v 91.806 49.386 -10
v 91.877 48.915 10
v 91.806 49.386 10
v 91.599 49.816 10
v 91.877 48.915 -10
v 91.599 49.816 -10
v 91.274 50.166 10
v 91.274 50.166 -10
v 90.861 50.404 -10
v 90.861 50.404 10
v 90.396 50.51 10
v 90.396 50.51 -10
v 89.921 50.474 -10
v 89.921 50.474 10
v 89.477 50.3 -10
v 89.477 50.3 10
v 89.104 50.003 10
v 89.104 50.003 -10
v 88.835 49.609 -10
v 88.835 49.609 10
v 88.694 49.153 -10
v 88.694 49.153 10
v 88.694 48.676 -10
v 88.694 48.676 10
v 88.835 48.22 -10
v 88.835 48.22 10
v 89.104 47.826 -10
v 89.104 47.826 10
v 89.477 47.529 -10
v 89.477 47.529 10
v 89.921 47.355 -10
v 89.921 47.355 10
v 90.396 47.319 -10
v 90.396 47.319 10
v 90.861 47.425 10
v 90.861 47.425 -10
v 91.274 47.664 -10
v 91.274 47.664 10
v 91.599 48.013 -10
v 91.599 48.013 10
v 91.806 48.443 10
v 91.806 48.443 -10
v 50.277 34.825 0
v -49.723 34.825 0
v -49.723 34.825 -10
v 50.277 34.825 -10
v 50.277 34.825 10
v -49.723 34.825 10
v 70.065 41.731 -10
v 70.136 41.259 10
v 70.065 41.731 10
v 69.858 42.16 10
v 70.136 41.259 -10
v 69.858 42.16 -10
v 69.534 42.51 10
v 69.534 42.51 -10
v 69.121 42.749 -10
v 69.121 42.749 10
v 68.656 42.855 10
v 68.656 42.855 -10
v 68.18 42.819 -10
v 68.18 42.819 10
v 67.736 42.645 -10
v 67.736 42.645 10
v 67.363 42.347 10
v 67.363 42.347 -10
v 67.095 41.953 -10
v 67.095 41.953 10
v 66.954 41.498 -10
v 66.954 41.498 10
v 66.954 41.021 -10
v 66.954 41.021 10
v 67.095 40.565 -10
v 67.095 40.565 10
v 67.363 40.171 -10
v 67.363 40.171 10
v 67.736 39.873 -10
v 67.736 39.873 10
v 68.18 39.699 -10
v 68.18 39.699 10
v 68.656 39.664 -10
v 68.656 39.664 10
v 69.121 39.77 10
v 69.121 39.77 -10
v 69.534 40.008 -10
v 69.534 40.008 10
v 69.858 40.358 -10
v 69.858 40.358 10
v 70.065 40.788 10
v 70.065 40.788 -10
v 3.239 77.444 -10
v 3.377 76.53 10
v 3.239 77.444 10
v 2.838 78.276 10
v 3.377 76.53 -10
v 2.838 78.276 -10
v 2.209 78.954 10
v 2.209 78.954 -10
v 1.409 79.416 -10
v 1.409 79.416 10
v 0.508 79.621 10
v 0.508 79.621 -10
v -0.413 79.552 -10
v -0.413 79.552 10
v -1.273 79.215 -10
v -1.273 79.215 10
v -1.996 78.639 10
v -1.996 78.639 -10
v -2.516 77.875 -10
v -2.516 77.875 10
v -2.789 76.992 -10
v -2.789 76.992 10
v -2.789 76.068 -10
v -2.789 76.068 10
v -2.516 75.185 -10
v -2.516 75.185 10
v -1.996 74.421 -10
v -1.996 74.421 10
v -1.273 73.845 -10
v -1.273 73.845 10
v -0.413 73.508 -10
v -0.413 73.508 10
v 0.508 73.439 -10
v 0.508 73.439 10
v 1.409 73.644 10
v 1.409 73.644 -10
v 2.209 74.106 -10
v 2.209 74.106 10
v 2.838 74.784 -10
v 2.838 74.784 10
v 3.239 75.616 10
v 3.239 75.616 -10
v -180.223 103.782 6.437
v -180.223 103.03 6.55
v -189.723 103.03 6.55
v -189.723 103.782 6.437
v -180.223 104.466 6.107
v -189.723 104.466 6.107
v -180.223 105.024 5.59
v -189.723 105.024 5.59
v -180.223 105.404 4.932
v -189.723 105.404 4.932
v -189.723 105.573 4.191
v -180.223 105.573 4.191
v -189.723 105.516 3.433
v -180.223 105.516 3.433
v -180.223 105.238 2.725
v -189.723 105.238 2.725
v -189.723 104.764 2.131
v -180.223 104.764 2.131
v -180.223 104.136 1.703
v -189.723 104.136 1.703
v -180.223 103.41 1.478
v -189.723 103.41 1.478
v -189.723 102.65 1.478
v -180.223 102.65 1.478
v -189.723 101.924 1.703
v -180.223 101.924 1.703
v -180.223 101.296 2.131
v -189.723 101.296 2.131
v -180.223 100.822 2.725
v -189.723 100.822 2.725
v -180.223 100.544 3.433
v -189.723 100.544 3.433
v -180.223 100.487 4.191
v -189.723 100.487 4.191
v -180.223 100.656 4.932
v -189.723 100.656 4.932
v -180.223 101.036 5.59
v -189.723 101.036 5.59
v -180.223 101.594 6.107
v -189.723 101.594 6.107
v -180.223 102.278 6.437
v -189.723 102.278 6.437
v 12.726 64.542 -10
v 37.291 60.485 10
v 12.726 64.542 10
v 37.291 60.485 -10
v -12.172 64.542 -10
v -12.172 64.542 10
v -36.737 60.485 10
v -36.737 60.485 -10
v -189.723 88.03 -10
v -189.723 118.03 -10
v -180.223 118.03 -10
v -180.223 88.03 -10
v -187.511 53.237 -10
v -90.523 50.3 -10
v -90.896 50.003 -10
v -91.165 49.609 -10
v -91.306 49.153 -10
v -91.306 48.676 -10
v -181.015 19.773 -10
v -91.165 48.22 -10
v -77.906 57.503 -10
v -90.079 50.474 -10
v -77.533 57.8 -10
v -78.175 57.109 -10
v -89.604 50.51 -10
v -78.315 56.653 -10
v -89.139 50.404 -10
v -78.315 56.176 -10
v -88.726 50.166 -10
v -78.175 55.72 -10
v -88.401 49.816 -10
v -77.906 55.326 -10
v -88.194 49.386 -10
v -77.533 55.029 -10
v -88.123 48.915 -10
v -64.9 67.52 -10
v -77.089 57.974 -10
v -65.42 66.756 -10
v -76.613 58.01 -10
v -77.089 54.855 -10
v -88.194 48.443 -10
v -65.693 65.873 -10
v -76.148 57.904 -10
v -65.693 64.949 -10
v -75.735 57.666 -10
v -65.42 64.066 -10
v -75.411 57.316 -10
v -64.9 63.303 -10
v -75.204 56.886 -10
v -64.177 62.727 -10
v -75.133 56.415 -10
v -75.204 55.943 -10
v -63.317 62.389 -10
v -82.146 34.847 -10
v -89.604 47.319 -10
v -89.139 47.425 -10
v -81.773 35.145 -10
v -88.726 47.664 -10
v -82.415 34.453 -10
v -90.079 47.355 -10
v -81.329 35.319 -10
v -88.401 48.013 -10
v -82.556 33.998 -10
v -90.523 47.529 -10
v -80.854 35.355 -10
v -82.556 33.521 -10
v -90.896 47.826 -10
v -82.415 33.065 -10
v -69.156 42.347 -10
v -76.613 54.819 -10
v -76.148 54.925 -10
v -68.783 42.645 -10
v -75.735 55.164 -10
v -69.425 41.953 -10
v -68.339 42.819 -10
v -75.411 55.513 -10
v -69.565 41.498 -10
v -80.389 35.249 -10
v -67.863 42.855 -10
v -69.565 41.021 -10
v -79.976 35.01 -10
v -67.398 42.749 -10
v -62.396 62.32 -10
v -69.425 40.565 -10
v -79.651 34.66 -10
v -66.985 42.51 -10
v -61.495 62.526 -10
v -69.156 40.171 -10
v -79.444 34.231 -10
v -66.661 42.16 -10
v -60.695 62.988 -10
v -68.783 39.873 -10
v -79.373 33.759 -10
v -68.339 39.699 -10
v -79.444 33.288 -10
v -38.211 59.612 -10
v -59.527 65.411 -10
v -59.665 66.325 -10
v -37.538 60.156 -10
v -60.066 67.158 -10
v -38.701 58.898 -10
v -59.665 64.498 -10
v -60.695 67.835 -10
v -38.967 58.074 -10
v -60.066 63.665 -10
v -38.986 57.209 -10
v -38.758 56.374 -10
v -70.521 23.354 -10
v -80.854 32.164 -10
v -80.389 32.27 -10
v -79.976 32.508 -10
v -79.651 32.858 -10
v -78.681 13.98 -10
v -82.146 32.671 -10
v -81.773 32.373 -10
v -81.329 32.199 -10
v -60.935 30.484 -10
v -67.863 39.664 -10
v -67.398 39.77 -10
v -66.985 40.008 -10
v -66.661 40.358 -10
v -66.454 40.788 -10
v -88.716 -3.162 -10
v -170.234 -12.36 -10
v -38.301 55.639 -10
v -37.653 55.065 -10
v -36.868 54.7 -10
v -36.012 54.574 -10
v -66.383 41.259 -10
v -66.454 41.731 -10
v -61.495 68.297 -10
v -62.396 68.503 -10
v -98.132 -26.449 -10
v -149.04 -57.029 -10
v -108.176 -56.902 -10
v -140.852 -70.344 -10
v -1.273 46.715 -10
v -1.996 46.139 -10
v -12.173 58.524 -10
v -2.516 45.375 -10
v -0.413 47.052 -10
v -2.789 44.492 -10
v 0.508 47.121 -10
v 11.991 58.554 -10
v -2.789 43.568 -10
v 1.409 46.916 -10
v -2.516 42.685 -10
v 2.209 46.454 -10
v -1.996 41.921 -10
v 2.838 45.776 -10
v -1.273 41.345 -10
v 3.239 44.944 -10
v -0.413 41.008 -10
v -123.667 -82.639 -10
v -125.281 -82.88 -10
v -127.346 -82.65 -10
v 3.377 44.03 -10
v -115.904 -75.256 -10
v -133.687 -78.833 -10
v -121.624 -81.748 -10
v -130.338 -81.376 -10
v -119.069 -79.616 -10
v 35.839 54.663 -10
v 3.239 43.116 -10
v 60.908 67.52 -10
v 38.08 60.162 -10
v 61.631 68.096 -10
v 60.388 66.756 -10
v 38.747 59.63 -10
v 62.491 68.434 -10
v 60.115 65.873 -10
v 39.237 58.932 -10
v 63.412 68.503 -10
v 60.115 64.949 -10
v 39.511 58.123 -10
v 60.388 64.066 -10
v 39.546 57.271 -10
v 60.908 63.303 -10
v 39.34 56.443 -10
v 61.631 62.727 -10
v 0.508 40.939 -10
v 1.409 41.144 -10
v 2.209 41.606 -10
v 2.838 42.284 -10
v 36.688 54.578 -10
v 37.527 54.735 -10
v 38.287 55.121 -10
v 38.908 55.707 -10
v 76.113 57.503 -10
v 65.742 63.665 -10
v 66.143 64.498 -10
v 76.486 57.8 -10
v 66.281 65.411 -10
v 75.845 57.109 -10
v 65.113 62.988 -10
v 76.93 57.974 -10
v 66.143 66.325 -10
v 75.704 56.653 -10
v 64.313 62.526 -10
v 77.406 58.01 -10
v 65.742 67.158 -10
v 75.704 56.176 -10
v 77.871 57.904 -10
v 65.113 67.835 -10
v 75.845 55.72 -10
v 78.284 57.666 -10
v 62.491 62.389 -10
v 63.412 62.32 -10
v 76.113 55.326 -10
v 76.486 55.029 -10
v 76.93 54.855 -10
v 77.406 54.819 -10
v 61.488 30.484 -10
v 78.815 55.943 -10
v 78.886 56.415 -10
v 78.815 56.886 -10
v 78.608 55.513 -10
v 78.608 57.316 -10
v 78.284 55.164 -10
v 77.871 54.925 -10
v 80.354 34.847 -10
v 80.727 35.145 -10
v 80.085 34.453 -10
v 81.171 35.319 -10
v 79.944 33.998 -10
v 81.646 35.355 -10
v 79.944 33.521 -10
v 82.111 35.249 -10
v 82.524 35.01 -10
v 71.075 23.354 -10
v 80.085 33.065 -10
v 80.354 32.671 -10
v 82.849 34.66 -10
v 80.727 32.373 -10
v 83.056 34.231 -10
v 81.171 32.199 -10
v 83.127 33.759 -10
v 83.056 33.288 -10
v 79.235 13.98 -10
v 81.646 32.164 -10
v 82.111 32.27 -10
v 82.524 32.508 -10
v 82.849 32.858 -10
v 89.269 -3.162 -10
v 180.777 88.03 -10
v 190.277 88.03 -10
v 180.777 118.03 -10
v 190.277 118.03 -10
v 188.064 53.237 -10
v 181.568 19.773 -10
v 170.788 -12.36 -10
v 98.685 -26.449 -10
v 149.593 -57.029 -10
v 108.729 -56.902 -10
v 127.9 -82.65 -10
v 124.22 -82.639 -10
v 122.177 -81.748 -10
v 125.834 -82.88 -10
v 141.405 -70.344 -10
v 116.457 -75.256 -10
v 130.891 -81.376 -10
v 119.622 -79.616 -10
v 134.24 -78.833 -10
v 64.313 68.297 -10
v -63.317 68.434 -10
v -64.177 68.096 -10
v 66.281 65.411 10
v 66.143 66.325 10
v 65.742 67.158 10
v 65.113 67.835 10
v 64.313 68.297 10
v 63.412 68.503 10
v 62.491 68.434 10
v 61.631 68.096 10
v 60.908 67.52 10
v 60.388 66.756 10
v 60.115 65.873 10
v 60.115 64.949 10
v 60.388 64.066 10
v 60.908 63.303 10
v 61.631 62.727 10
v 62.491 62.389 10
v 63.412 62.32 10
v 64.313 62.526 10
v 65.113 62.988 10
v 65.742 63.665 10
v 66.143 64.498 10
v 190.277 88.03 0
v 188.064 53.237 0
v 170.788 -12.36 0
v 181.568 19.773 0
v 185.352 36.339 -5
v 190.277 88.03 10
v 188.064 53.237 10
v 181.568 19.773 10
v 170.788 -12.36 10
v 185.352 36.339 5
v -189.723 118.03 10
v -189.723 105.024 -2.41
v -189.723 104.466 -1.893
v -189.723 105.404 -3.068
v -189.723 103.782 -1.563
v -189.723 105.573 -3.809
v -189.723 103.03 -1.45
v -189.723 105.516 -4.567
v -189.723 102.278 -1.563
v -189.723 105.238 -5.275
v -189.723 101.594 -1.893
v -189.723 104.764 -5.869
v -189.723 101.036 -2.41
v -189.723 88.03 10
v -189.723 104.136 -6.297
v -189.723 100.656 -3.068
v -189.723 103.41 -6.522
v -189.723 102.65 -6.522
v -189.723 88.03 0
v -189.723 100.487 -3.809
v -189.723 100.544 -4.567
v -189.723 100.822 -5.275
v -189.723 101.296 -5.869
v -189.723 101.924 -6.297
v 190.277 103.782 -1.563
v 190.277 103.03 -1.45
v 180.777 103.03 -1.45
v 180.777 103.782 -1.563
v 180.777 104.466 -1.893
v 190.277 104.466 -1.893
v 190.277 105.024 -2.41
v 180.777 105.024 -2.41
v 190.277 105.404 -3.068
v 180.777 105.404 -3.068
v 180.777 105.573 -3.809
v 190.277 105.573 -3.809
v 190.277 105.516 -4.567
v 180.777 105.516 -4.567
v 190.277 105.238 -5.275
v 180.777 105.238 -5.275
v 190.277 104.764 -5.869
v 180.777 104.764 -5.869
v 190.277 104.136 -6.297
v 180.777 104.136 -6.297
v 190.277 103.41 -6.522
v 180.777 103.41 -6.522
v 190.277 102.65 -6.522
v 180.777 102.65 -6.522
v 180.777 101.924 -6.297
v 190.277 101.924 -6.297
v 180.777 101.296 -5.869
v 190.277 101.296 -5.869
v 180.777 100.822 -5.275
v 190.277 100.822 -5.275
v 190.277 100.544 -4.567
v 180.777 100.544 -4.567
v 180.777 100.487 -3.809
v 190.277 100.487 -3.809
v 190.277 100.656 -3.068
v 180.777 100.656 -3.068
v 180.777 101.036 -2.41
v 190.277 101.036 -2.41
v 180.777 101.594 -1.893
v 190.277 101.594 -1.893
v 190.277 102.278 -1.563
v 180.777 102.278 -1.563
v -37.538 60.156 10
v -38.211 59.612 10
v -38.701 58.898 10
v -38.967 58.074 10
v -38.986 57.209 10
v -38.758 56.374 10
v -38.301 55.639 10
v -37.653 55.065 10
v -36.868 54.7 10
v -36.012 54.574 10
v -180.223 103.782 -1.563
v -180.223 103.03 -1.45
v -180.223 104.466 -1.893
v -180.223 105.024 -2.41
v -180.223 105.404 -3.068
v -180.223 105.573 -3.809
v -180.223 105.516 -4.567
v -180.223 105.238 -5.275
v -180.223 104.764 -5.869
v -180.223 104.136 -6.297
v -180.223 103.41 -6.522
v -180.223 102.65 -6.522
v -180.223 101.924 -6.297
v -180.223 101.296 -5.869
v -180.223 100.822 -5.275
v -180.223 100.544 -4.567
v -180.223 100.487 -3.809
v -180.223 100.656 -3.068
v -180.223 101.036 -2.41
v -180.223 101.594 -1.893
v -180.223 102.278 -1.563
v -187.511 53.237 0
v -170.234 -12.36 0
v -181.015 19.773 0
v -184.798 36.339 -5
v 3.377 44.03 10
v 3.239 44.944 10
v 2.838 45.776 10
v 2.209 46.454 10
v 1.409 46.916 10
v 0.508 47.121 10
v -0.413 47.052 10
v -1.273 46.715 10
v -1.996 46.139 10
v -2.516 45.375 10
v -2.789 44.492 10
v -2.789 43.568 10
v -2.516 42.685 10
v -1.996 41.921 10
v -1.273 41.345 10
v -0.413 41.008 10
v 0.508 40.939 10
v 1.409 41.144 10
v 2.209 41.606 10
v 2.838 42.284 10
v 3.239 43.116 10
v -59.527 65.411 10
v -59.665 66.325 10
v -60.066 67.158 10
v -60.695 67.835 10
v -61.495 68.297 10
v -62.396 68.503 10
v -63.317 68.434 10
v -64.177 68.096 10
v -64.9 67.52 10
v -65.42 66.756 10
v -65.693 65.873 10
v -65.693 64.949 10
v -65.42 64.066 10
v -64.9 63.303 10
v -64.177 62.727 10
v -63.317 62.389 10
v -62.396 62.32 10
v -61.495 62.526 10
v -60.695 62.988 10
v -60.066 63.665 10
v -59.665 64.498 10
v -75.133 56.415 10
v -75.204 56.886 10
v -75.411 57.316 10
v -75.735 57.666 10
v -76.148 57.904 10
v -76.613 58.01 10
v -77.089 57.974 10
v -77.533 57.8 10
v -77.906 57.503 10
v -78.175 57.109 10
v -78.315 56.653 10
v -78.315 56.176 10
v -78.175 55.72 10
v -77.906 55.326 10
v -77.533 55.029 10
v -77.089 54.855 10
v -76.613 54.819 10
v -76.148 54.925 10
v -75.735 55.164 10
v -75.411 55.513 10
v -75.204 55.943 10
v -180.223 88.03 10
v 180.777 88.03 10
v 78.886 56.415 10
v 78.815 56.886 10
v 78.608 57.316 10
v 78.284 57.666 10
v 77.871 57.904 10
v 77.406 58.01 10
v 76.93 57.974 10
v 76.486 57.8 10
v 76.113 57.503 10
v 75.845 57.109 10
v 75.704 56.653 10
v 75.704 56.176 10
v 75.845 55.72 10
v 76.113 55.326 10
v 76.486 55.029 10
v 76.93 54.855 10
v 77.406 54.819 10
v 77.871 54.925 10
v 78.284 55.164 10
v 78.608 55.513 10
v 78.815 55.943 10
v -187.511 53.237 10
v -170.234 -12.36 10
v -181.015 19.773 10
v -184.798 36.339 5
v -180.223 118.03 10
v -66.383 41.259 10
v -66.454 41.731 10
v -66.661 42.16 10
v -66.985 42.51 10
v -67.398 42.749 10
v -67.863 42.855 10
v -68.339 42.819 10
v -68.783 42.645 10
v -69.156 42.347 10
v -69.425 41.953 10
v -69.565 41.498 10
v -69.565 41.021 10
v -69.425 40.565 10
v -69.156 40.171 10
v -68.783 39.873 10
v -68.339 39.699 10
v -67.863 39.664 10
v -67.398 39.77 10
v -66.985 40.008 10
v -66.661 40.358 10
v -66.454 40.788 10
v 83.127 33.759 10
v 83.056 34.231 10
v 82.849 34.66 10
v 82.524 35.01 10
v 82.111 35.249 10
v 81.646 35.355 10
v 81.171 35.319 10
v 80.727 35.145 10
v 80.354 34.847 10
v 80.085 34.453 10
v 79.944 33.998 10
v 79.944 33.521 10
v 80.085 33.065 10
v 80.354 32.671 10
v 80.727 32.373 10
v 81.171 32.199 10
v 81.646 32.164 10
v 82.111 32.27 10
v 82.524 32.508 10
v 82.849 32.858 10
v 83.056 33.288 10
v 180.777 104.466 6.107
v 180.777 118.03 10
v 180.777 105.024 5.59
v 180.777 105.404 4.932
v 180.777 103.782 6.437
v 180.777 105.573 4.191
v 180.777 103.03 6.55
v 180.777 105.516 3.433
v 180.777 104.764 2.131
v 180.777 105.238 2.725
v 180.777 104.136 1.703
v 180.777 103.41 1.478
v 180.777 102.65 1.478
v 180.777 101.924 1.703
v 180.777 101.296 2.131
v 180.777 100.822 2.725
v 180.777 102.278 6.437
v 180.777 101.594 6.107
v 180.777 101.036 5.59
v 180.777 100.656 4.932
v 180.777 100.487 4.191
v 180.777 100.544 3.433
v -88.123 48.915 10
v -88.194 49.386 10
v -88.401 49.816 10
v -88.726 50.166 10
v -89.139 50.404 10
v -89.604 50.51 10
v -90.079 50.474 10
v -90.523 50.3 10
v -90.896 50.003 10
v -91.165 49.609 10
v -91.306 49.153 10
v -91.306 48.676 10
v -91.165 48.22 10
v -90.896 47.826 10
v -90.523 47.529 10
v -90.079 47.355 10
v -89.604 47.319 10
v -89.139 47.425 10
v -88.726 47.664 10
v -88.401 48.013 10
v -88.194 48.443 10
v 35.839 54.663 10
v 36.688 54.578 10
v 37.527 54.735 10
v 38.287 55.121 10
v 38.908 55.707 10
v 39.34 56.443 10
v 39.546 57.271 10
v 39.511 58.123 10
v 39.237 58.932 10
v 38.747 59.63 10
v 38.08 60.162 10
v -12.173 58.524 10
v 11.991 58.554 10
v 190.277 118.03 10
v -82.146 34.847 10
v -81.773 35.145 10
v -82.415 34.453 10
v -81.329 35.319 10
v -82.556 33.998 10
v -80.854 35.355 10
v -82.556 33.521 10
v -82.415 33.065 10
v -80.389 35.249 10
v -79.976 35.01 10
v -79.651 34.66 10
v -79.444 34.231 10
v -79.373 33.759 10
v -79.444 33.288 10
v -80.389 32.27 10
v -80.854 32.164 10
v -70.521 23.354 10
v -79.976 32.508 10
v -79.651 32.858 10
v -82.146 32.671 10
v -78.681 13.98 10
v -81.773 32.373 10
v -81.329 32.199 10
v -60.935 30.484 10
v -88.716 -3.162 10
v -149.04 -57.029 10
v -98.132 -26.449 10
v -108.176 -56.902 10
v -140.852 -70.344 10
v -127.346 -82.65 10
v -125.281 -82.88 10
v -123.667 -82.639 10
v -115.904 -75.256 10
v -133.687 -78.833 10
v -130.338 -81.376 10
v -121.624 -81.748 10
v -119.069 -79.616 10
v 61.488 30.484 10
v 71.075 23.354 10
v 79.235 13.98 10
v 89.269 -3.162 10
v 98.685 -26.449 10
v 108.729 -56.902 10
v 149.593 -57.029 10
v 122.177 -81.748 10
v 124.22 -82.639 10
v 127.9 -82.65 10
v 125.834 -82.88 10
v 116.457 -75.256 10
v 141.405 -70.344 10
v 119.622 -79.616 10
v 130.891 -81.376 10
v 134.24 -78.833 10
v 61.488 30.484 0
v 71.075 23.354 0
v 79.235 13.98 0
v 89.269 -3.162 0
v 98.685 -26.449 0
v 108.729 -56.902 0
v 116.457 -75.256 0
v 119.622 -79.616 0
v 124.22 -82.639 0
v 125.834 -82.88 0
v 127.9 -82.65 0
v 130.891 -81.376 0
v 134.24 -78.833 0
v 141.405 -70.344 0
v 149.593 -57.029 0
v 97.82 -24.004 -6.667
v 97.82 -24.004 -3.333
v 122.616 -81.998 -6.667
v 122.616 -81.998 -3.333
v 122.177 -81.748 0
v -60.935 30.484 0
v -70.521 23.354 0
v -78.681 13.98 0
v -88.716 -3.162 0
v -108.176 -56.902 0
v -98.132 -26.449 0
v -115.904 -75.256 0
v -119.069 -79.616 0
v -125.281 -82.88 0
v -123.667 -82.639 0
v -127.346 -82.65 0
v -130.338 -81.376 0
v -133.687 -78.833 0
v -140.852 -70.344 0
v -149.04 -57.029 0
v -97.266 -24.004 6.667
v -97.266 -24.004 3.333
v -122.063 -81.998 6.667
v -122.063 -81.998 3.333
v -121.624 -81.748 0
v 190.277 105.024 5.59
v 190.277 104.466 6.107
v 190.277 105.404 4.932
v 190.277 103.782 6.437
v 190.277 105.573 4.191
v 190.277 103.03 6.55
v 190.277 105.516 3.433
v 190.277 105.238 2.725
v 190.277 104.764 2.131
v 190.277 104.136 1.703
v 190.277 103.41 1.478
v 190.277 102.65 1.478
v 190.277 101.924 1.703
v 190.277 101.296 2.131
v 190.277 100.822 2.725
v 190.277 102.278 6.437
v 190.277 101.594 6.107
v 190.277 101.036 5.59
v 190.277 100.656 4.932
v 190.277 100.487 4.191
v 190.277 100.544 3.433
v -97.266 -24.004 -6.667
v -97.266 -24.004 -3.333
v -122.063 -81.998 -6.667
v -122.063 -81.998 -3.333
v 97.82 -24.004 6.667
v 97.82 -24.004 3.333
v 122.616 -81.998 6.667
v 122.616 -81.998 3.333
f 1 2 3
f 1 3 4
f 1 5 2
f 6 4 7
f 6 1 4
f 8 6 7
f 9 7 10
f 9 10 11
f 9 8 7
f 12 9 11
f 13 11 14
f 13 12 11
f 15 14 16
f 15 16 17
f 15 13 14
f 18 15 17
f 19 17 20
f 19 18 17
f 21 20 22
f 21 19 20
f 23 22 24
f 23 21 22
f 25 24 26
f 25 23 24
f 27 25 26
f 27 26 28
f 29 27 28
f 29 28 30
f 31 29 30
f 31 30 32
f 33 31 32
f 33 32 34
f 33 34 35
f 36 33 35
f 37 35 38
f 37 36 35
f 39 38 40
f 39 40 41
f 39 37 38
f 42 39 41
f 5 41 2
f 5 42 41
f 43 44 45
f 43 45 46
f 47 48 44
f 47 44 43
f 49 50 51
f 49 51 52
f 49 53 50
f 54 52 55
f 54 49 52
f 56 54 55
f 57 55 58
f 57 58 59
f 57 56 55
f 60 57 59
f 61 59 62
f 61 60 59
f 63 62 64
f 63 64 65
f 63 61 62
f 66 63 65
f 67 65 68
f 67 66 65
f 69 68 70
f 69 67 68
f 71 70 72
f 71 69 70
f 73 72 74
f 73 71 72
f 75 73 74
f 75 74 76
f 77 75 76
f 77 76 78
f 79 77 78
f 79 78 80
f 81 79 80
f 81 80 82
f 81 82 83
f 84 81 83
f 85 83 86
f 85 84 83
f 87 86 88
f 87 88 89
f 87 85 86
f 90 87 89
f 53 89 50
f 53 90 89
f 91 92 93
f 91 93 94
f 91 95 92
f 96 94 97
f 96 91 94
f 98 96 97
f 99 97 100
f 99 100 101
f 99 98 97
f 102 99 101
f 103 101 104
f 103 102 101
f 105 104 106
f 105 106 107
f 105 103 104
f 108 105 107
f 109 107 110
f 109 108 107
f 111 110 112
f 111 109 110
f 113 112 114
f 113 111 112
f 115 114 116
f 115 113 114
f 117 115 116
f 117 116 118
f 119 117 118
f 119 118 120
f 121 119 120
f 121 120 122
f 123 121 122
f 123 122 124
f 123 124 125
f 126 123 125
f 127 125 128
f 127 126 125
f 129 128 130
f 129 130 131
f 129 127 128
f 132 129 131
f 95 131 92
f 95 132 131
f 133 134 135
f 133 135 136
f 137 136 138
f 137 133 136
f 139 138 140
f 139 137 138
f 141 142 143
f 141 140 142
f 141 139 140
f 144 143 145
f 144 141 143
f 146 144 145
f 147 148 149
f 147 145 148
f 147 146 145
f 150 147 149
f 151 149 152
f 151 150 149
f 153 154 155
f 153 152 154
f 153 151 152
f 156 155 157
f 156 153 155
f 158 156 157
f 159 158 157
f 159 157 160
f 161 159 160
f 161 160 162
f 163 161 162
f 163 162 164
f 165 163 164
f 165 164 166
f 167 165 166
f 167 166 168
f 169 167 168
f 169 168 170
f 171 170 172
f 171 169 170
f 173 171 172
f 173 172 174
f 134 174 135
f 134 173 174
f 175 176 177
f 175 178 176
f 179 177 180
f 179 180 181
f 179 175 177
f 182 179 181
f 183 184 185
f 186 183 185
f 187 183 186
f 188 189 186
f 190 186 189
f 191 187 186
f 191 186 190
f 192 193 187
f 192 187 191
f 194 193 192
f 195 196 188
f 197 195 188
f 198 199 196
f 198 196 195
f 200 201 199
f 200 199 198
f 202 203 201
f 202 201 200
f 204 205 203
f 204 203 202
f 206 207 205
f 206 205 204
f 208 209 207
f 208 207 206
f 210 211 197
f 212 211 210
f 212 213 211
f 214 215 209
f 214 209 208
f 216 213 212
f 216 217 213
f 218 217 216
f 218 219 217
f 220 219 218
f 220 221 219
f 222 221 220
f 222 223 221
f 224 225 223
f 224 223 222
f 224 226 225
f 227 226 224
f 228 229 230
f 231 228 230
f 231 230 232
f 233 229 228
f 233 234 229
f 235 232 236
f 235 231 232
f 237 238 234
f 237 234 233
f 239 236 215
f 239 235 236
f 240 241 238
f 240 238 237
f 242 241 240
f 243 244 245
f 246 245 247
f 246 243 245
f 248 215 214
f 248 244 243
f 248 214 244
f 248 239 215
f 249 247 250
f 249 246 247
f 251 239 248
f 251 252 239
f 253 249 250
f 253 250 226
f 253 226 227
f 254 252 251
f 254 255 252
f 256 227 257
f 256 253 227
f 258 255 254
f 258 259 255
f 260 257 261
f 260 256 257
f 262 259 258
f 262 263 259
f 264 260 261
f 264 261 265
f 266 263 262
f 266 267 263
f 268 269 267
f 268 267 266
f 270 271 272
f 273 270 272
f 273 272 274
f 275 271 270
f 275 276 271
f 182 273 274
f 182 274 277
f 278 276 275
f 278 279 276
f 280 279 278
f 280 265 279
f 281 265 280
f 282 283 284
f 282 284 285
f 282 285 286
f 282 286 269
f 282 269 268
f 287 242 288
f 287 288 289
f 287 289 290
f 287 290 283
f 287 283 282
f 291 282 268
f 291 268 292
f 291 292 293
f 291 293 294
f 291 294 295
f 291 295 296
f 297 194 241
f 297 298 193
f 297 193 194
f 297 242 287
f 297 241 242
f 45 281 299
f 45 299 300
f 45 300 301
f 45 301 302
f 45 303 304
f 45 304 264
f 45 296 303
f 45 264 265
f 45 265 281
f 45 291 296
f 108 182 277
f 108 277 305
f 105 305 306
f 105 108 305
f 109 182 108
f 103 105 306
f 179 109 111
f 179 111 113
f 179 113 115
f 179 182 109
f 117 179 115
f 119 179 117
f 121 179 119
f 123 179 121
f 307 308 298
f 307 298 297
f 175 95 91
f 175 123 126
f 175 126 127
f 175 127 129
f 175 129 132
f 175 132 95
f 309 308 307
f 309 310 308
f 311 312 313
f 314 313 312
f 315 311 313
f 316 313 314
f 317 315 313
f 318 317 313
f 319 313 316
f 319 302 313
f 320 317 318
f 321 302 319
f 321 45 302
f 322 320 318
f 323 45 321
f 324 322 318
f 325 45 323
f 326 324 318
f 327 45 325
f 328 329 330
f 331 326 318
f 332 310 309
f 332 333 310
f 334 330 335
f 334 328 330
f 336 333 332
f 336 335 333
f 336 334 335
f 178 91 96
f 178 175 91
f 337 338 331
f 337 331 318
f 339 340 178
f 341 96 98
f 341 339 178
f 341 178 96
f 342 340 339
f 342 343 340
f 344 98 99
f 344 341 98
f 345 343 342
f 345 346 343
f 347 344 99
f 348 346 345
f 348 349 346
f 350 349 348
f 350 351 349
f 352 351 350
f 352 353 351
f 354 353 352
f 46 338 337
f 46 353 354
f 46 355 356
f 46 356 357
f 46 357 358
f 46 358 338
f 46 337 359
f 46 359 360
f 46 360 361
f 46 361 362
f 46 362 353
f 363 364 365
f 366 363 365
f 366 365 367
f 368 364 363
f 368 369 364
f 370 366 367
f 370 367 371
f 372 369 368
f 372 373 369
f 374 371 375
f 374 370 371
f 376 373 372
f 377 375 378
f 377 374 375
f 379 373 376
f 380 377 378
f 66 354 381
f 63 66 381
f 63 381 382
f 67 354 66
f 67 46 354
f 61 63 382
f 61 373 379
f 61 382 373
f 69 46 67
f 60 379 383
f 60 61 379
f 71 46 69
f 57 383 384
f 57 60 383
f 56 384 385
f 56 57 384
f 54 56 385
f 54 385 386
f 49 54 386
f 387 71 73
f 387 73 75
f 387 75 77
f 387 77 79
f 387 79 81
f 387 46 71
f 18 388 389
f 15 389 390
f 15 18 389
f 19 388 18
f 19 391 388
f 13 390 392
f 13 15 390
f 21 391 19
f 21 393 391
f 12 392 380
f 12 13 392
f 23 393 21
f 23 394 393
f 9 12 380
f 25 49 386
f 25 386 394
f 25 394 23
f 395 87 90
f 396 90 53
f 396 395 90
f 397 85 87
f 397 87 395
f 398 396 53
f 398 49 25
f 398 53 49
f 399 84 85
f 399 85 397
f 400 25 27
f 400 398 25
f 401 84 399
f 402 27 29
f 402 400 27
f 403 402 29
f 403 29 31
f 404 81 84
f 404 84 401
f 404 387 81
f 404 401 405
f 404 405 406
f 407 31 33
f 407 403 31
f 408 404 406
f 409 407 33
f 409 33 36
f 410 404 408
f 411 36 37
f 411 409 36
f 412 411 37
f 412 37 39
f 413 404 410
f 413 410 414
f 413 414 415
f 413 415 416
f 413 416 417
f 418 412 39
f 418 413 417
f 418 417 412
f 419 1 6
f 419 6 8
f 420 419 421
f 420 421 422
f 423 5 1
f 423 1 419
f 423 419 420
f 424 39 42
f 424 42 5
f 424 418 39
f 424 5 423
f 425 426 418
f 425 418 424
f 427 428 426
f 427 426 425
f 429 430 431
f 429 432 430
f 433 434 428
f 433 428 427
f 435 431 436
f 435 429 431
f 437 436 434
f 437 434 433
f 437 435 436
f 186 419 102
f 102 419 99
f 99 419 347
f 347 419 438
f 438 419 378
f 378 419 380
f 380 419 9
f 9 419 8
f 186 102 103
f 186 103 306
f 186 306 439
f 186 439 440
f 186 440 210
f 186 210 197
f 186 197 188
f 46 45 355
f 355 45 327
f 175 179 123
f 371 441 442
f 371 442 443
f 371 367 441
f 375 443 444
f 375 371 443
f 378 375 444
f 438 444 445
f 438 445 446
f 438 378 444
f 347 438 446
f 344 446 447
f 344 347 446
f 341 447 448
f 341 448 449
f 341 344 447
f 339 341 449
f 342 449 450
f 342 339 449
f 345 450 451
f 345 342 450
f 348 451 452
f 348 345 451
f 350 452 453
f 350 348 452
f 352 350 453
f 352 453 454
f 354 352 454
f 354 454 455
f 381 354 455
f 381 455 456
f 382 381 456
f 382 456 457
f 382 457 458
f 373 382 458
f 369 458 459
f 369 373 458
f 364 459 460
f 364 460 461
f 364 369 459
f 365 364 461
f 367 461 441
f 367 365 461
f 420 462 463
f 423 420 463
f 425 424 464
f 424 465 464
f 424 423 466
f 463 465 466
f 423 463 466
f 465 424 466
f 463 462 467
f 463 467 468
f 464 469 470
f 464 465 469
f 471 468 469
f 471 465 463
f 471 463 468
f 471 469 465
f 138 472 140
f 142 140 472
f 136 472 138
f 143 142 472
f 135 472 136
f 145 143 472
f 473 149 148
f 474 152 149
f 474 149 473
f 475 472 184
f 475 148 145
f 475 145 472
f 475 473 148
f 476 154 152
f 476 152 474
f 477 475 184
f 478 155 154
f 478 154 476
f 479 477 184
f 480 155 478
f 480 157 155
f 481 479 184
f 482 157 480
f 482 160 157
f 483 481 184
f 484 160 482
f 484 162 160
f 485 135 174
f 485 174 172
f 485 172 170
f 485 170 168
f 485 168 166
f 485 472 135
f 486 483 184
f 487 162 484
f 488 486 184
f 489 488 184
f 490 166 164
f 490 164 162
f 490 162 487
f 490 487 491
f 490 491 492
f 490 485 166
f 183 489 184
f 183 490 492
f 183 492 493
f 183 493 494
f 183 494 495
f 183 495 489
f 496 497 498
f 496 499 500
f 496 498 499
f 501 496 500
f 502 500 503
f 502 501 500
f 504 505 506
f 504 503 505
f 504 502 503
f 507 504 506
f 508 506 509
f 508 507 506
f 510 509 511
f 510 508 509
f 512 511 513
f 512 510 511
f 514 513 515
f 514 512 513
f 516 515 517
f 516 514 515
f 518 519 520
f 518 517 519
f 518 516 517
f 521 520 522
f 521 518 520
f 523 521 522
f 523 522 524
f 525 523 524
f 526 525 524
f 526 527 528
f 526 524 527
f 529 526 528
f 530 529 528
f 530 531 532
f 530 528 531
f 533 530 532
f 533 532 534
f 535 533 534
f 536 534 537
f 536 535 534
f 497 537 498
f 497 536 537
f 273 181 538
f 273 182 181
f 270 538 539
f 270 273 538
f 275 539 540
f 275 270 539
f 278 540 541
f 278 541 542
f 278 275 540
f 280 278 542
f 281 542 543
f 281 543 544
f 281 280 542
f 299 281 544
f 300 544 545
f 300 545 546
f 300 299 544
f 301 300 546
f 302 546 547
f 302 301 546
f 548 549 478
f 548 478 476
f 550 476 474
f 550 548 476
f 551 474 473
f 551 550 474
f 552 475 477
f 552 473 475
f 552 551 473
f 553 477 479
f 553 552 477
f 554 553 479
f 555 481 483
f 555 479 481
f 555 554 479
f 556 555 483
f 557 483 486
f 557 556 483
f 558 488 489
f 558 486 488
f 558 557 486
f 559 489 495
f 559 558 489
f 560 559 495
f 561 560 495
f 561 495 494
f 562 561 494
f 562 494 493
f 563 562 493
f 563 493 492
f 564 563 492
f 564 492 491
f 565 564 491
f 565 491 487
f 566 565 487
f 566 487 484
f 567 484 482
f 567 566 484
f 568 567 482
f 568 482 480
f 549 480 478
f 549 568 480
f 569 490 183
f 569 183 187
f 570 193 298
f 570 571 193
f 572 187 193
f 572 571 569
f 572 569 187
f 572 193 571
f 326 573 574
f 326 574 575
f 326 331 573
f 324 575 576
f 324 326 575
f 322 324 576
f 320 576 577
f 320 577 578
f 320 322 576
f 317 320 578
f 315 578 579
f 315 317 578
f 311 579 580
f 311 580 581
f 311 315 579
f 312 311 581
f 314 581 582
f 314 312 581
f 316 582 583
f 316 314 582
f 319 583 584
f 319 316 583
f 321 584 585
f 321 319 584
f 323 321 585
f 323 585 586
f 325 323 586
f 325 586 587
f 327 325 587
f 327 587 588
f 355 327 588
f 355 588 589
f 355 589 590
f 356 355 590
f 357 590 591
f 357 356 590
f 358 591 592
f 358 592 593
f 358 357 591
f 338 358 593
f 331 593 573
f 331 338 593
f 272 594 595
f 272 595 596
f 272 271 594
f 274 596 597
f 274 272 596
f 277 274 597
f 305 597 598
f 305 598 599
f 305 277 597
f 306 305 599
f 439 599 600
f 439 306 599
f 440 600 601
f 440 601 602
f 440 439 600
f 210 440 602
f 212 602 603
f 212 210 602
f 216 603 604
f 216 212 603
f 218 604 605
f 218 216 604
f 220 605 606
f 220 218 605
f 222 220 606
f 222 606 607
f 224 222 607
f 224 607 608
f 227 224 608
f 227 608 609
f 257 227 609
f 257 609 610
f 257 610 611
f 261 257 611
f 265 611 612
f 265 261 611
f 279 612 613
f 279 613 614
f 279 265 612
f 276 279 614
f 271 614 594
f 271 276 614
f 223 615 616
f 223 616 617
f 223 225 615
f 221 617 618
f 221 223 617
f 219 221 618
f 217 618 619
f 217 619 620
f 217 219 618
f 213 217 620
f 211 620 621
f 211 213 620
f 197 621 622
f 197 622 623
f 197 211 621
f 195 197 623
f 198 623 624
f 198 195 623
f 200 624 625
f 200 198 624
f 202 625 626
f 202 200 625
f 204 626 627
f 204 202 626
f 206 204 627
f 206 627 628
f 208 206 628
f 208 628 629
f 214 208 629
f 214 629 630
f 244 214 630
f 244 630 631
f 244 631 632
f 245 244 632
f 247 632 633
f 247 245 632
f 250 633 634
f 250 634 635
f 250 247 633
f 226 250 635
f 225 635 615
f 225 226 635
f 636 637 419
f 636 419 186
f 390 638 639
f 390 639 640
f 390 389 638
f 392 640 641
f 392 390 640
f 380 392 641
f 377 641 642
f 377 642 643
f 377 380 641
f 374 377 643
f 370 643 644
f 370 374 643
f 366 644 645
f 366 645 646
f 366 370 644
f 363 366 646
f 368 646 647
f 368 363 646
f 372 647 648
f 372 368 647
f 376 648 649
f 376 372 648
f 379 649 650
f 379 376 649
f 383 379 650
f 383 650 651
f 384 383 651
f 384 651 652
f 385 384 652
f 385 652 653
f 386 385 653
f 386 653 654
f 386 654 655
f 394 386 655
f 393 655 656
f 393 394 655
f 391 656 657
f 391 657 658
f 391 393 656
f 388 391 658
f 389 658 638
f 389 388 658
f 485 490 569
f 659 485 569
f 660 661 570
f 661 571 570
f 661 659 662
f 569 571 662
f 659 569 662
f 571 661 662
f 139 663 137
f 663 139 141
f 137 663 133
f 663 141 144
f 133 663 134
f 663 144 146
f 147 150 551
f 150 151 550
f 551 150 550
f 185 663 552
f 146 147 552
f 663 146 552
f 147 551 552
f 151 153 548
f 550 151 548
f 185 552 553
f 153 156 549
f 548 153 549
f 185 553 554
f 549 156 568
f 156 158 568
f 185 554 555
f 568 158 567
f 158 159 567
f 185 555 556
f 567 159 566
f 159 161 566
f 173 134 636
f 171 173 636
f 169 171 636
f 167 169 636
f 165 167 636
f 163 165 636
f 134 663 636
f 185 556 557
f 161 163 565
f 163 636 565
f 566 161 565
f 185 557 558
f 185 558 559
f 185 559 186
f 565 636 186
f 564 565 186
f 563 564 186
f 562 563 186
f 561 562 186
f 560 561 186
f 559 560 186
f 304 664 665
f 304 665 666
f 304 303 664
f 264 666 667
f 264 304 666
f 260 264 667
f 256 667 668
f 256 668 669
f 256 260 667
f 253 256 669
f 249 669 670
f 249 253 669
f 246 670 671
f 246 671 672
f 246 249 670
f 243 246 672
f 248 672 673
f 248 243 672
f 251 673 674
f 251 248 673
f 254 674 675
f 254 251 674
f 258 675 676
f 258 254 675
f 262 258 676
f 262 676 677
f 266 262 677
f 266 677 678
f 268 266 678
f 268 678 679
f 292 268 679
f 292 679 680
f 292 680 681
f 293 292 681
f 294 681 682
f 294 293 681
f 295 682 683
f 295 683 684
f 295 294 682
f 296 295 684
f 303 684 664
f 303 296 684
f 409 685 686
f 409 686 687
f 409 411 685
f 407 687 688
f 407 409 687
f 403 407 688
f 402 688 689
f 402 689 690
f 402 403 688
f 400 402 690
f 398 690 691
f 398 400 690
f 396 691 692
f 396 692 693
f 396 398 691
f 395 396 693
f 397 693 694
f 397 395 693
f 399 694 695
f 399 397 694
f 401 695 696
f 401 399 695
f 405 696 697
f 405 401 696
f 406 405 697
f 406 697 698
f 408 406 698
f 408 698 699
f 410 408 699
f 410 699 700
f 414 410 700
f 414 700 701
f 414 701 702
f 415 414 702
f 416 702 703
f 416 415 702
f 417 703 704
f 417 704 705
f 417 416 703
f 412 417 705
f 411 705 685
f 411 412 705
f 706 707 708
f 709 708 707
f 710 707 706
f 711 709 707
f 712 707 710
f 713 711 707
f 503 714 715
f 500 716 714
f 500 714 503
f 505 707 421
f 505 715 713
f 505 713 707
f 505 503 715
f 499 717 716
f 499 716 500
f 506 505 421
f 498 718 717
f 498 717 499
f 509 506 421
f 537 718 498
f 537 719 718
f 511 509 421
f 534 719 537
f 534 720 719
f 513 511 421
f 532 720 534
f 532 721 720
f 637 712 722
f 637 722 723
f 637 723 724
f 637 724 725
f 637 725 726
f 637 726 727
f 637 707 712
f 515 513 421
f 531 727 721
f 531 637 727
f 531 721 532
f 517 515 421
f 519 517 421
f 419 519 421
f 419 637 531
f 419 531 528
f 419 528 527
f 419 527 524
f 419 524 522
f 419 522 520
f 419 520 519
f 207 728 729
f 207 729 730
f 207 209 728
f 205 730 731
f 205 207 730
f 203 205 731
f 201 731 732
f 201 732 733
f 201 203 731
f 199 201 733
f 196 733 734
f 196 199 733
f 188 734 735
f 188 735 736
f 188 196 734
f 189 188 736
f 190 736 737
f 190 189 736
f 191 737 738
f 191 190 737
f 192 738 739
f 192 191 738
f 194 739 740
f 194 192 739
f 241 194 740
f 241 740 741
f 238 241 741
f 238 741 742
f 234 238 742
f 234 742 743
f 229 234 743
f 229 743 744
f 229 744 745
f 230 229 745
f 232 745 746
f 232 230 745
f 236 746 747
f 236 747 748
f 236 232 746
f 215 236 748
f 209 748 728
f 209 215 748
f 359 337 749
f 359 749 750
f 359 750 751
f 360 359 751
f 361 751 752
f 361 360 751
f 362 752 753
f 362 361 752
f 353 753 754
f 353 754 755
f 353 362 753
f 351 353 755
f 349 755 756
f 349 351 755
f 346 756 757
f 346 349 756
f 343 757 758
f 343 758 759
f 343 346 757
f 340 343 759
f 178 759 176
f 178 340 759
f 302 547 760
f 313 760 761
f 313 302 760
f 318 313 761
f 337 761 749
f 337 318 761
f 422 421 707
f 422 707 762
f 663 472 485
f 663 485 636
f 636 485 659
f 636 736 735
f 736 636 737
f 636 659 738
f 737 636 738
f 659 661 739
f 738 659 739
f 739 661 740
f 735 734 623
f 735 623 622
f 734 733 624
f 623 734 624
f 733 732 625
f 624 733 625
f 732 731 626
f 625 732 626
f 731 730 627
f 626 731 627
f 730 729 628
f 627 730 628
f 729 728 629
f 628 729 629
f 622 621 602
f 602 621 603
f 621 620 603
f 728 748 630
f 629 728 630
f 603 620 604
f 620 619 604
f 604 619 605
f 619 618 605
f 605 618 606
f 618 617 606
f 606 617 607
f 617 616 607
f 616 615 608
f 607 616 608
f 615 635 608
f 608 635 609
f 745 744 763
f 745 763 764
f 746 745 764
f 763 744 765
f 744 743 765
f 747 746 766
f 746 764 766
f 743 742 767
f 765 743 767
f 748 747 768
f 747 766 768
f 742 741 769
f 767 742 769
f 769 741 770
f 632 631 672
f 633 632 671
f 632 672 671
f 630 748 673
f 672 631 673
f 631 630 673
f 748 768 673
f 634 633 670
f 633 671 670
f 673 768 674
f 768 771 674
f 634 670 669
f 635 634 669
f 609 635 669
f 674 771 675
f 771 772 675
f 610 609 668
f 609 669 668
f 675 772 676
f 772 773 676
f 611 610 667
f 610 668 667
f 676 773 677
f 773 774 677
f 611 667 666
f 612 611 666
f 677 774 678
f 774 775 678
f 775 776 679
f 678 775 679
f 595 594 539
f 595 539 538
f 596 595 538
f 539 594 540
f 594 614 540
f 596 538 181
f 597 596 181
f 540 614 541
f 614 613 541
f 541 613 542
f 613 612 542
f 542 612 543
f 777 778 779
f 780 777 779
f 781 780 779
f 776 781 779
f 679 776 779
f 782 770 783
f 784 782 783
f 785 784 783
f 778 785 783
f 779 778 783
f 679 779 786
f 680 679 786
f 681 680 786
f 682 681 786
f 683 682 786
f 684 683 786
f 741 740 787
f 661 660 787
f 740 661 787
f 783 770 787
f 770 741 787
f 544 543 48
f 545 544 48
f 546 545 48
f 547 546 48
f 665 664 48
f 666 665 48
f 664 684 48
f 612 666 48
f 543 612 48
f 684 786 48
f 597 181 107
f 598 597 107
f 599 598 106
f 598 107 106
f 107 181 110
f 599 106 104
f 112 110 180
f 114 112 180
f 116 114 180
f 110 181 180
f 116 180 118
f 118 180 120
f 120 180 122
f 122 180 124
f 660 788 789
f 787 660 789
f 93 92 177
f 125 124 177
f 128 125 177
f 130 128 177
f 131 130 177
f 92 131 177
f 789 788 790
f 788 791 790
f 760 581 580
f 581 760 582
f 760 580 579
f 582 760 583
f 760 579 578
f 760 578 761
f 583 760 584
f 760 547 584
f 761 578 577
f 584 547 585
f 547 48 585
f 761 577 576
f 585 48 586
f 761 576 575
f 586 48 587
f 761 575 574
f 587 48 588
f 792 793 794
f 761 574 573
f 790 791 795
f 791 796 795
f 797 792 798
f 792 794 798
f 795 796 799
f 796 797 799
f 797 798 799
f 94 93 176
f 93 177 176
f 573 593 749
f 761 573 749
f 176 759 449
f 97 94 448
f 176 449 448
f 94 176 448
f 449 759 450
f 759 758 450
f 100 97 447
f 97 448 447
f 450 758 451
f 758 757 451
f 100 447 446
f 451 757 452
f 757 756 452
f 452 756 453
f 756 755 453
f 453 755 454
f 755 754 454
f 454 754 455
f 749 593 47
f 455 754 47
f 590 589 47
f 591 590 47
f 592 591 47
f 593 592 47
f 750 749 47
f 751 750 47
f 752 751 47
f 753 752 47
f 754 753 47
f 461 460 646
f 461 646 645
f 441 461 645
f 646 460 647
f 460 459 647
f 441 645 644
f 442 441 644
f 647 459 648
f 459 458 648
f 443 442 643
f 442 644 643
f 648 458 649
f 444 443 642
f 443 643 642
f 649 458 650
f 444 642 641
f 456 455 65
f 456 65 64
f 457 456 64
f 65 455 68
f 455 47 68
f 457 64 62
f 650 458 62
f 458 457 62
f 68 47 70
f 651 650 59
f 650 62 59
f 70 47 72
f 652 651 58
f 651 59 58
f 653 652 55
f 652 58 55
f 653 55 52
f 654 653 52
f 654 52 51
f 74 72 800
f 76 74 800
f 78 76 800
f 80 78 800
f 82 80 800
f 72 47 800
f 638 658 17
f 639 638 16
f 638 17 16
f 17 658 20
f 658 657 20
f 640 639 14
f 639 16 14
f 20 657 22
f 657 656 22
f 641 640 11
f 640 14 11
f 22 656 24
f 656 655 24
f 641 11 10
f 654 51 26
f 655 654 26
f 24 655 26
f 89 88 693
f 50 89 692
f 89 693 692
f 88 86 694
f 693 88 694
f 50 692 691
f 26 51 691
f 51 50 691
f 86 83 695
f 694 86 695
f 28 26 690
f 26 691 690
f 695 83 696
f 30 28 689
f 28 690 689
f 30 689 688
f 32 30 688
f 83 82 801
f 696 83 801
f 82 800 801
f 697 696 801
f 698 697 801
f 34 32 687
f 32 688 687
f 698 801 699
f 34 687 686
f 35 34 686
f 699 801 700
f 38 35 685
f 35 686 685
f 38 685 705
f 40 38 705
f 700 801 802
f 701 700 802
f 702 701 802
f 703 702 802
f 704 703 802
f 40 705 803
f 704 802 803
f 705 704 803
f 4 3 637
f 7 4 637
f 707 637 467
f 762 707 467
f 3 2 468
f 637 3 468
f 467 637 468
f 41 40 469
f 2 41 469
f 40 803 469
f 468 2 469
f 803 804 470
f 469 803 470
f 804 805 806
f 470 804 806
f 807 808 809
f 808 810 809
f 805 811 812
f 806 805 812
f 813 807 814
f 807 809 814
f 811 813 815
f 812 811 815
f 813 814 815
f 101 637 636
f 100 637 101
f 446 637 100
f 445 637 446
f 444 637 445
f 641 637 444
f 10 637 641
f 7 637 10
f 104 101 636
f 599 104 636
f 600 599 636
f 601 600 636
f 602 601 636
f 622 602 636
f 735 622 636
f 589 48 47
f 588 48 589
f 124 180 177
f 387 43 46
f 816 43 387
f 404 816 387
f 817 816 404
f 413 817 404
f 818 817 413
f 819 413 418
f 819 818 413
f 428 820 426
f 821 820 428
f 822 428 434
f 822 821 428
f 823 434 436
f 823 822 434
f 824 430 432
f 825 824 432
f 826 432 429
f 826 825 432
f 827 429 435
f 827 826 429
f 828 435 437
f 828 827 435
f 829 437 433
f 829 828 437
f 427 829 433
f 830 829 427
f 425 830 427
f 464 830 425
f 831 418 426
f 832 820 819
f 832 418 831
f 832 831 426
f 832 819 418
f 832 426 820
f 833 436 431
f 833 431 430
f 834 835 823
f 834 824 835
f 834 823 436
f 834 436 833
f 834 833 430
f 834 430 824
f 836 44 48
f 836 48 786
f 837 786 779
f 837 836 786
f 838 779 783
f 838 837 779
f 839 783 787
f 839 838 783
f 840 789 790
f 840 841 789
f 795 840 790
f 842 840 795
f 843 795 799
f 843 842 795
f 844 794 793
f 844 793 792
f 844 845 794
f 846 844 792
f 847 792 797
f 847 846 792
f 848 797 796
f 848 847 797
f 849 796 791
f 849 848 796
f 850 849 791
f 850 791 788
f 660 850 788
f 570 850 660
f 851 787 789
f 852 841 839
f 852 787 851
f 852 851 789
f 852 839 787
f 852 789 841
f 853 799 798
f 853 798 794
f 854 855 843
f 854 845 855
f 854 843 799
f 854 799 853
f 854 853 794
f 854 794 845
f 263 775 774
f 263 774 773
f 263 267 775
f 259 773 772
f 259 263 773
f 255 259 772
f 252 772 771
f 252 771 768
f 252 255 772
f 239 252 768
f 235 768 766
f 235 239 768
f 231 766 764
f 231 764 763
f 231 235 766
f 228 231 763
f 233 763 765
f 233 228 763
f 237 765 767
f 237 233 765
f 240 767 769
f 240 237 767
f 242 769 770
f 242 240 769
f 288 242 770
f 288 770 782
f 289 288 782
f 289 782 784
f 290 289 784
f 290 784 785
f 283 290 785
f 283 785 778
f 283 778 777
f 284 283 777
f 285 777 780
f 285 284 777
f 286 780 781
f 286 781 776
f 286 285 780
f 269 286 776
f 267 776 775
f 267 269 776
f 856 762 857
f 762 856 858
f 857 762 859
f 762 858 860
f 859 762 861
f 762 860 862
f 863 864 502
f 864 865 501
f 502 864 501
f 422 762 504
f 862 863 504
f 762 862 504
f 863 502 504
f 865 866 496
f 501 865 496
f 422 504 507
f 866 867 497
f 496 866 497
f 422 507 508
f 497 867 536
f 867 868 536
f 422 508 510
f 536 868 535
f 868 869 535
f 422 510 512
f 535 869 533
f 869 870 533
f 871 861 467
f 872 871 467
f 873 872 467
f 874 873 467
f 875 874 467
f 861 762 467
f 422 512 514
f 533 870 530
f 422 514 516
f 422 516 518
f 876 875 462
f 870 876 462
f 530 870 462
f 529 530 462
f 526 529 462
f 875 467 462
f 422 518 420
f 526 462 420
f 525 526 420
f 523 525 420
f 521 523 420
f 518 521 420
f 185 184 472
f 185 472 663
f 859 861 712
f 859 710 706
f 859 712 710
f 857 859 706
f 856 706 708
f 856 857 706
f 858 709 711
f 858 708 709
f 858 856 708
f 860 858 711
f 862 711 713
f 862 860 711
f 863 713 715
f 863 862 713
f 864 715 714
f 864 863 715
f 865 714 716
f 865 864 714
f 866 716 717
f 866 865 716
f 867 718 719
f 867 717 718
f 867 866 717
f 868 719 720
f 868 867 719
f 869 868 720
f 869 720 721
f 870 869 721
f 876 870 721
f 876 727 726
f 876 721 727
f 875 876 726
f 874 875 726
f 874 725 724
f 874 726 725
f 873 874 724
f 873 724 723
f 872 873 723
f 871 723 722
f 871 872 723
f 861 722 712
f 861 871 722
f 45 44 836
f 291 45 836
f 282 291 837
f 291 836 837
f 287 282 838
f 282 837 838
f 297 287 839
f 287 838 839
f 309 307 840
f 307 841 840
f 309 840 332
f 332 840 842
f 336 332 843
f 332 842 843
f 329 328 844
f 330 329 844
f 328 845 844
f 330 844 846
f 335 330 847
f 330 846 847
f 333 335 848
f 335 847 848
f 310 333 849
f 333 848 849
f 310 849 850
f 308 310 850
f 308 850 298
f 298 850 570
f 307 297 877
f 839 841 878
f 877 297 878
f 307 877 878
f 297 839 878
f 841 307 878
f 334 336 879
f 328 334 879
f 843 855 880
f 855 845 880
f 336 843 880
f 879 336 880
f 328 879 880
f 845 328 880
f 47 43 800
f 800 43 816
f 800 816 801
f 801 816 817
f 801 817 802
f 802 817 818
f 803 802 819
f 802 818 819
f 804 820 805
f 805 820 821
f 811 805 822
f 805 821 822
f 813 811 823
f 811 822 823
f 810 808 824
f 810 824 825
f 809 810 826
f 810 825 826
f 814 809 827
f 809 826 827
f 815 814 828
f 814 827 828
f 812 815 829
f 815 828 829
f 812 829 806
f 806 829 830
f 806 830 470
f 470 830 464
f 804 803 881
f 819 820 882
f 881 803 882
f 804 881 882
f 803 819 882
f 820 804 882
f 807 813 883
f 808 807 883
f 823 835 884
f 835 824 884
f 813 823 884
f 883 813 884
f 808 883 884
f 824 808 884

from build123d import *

# Parameters (mm, degrees)
SKETCH_1_R               = 3.1
SKETCH_1_R_2             = 1.6
EXTRUDE_1_DEPTH          = 10
SKETCH_7_W               = 9.5
SKETCH_7_H               = 20
EXTRUDE_2_DEPTH          = 30
CUT_EXTRUDE_1_DEPTH      = 399.034023277
CUT_EXTRUDE_1_DEPTH_BACK = 399.034023277
SKETCH_8_R               = 2.55


with BuildPart() as part:
    # 草图1 → 凸台-拉伸1 (new, symmetric)
    # profile 1 of 3: a face of its own
    with BuildSketch(Plane.XY):
        with BuildLine():
            Line((-49.723400677, 34.824923839), (50.276599325, 34.824923839))
            add(Edge.make_bspline(
                [(50.276599325, 34.824923839), (124.566445362, 17.843319342), (95.555290462, -188.079366879), (170.787580761, -12.360236435)],
                knots=[0, 0, 0, 0, 1, 1, 1, 1], degree=3))
            ThreePointArc((170.787580761, -12.360236435), (0.276599325, 88.030011373), (-170.23438211, -12.360236435))
            add(Edge.make_bspline(
                [(-49.723400677, 34.824923839), (-124.01324671, 17.843319337), (-95.002091812, -188.079366877), (-170.23438211, -12.360236435)],
                knots=[0, 0, 0, 0, 1, 1, 1, 1], degree=3))
        make_face()
        with Locations((-62.62746254, 65.411358975)):
            Circle(SKETCH_1_R, mode=Mode.SUBTRACT)
        with Locations((-76.733019619, 56.414584056)):
            Circle(SKETCH_1_R_2, mode=Mode.SUBTRACT)
        with Locations((-89.723400674, 48.914584057)):
            Circle(SKETCH_1_R_2, mode=Mode.SUBTRACT)
        with Locations((-67.983019619, 41.25913949)):
            Circle(SKETCH_1_R_2, mode=Mode.SUBTRACT)
        with Locations((-80.973400674, 33.759139488)):
            Circle(SKETCH_1_R_2, mode=Mode.SUBTRACT)
        with Locations((0.276599325, 76.530011374)):
            Circle(SKETCH_1_R, mode=Mode.SUBTRACT)
        with Locations((0.276599325, 44.030011375)):
            Circle(SKETCH_1_R, mode=Mode.SUBTRACT)
        with Locations((63.180661188, 65.411358975)):
            Circle(SKETCH_1_R, mode=Mode.SUBTRACT)
        with Locations((77.286218268, 56.414584056)):
            Circle(SKETCH_1_R_2, mode=Mode.SUBTRACT)
        with Locations((90.276599325, 48.914584057)):
            Circle(SKETCH_1_R_2, mode=Mode.SUBTRACT)
        with Locations((81.526599324, 33.759139488)):
            Circle(SKETCH_1_R_2, mode=Mode.SUBTRACT)
        with Locations((68.536218267, 41.25913949)):
            Circle(SKETCH_1_R_2, mode=Mode.SUBTRACT)
        with BuildLine():
            ThreePointArc((-36.011685017, 54.574370317), (-0.091755893, 59.031248881), (35.839117979, 54.663483137))
            ThreePointArc((35.839117979, 54.663483137), (39.472360183, 56.849455003), (37.290649352, 60.485257494))
            ThreePointArc((37.290649352, 60.485257494), (0.276599325, 65.052037292), (-36.737450702, 60.485257494))
            ThreePointArc((-36.737450702, 60.485257494), (-38.986236568, 57.209141311), (-36.011685017, 54.574370317))
        make_face(mode=Mode.SUBTRACT)
    # profile 2 of 3: a face of its own
    with BuildSketch(Plane.XY):
        with BuildLine():
            add(Edge.make_bspline(
                [(-189.723400675, 88.030011373), (-189.61780162, 34.842552906), (-170.23438211, -12.360236435)],
                knots=[0, 0, 0, 0.9050572, 0.9050572, 0.9050572], degree=2))
            ThreePointArc((-170.23438211, -12.360236435), (-98.657970523, 61.068551265), (0.276599915, 88.030011373))
            Line((0.276599915, 88.030011373), (-189.723400675, 88.030011373))
        make_face()
    # profile 3 of 3: a face of its own
    with BuildSketch(Plane.XY):
        with BuildLine():
            ThreePointArc((0.276599915, 88.030011373), (99.211169681, 61.068550966), (170.787580761, -12.360236435))
            add(Edge.make_bspline(
                [(190.276599325, 88.030011373), (190.171000271, 34.842552906), (170.787580761, -12.360236435)],
                knots=[0, 0, 0, 0.9050572, 0.9050572, 0.9050572], degree=2))
            Line((190.276599325, 88.030011373), (0.276599915, 88.030011373))
        make_face()
    extrude(amount=EXTRUDE_1_DEPTH, both=True)

    # 草图7 → 凸台-拉伸2 (add)
    with BuildSketch(Plane(origin=(0, 88.030011373, 0), x_dir=(1, 0, 0), z_dir=(0, 1, 0))):
        with Locations((-184.973400675, 0)):
            Rectangle(SKETCH_7_W, SKETCH_7_H)
        with Locations((185.526599325, 0)):
            Rectangle(SKETCH_7_W, SKETCH_7_H)
    extrude(amount=EXTRUDE_2_DEPTH)

    # 草图8 → 切除-拉伸1 (cut, two sides: drawn at the far end of the back side and taken through both)
    with BuildSketch(Plane.ZY.offset(189.723400675).offset(-CUT_EXTRUDE_1_DEPTH_BACK)):
        with Locations((-4, 103.030011373)):
            Circle(SKETCH_8_R)
        with Locations((4, 103.030011373)):
            Circle(SKETCH_8_R)
    extrude(amount=CUT_EXTRUDE_1_DEPTH + CUT_EXTRUDE_1_DEPTH_BACK, mode=Mode.SUBTRACT)


solid = part.part
